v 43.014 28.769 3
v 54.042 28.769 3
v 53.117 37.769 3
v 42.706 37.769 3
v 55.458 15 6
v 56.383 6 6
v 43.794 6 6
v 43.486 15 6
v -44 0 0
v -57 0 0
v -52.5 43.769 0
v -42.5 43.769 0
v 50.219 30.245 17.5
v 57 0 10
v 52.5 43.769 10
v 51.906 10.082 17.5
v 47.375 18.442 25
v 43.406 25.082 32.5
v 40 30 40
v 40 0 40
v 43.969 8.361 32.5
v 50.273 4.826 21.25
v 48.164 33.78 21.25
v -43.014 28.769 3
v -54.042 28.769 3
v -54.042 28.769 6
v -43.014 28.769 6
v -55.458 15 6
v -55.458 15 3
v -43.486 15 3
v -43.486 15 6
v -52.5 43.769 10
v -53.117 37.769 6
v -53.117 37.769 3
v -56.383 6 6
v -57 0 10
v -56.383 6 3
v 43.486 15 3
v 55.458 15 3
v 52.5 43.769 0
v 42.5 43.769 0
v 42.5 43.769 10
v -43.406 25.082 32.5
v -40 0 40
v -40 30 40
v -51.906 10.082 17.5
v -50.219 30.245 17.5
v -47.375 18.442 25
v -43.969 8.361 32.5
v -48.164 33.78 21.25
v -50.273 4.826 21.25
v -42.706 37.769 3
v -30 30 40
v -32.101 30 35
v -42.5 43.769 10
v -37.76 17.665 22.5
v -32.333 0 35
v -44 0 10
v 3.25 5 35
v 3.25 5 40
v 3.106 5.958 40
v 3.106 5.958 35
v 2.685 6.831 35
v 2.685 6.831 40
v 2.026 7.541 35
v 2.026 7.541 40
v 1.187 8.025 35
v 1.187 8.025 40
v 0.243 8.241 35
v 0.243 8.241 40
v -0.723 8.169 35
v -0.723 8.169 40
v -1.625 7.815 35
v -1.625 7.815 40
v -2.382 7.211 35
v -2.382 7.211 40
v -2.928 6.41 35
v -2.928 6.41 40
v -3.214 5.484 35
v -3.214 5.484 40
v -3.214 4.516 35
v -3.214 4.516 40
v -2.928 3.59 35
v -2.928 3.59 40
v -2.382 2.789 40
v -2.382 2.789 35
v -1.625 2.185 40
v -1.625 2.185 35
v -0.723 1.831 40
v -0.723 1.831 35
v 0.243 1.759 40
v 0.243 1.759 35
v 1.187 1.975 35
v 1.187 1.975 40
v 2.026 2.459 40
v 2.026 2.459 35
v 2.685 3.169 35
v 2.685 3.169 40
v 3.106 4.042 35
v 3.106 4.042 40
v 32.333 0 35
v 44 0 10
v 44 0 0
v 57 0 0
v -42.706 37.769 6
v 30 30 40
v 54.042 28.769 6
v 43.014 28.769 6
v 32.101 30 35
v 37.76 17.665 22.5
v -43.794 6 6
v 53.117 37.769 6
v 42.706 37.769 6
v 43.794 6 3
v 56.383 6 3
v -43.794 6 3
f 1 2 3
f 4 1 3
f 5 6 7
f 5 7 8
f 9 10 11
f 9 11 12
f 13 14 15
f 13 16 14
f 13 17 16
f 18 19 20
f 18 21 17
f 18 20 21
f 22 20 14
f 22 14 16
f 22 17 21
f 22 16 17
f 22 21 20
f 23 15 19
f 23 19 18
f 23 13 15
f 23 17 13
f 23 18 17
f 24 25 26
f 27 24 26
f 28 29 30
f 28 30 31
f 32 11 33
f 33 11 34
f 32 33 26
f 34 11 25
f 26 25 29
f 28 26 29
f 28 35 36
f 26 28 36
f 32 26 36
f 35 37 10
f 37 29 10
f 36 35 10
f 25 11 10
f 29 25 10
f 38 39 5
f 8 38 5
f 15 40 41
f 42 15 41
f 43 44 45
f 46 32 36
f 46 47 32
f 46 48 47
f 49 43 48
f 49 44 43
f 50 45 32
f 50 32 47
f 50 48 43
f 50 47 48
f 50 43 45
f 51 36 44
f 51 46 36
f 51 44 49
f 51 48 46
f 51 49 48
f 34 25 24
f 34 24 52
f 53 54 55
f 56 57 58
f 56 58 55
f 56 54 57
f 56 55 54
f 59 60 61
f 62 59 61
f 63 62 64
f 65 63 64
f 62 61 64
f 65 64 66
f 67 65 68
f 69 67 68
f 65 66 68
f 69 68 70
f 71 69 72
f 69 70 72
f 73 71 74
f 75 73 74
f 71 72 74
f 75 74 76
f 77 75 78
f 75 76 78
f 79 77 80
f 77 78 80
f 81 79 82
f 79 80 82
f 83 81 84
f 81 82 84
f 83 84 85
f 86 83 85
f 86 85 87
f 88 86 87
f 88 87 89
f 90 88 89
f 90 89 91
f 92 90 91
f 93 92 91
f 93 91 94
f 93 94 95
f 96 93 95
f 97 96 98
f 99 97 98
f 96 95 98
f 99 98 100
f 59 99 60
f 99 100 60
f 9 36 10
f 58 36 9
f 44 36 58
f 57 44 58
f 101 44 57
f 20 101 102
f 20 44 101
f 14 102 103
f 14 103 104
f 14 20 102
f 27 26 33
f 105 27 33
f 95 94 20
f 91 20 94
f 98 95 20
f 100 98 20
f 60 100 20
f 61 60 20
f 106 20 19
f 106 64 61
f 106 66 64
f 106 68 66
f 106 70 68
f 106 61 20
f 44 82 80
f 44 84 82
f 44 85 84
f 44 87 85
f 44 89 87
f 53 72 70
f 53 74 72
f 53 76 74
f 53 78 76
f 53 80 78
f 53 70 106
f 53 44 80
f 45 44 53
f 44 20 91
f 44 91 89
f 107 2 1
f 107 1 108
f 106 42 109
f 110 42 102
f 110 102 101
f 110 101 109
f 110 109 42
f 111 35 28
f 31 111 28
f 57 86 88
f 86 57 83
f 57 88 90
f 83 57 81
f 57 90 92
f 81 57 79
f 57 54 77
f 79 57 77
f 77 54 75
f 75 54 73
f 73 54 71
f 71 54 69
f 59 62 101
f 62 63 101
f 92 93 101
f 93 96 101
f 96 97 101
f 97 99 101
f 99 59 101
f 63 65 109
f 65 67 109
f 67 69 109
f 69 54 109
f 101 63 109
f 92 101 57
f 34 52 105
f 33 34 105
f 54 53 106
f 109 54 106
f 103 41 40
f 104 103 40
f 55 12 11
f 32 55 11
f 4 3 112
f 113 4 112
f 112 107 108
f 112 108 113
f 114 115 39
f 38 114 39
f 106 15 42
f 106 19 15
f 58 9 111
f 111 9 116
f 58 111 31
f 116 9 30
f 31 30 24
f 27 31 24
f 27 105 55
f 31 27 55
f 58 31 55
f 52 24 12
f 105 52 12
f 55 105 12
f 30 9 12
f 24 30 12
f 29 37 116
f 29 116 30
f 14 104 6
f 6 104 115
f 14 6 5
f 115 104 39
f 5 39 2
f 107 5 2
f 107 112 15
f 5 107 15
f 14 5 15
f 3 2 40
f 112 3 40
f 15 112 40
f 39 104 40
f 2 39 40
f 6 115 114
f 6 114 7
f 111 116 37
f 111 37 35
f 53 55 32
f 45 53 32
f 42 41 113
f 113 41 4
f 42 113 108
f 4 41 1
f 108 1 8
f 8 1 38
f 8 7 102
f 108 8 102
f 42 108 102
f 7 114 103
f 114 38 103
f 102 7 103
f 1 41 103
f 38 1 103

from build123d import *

# Parameters (mm, degrees)
F1_DEPTH  = 10
F3_W      = 10
F3_H      = 30
F6_W      = 80
F6_H      = 30
F7_DEPTH  = 5
F8_R      = 3.25
F9_DEPTH  = 5
F10_W     = 9
F10_H     = 3
F11_DEPTH = 100


with BuildPart() as f1:
    # F0 (on Top) → F1 (new body)
    with BuildSketch(Plane.XY):
        Polygon((-52.5, 43.769281), (-57, 0), (-44, 0), (-42.5, 43.769281), align=None)
        Polygon((42.5, 43.769281), (44, 0), (57, 0), (52.5, 43.769281), align=None)
    extrude(amount=F1_DEPTH)

    # F1_face (on face) → F4 section 0
    with BuildSketch(Plane(origin=(-49.065217, 20.933135, 10), x_dir=(1, 0, 0), z_dir=(0, 0, 1))):
        Polygon((-3.434783, 22.836147), (-7.934783, -20.933135), (5.065217, -20.933135), (6.565217, 22.836147), align=None)
    # F3 (on offset) → F4 section 1
    with BuildSketch(Plane.XY.offset(40)):
        with Locations((-35, 15)):
            Rectangle(F3_W, F3_H)
    loft()

    # F1_face (on face) → F5 section 0
    with BuildSketch(Plane(origin=(-49.065217, 20.933135, 10), x_dir=(1, 0, 0), z_dir=(0, 0, 1))):
        Polygon((91.565217, 22.836147), (93.065217, -20.933135), (106.065217, -20.933135), (101.565217, 22.836147), align=None)
    # F3 (on offset) → F5 section 1
    with BuildSketch(Plane.XY.offset(40)):
        with Locations((35, 15)):
            Rectangle(F3_W, F3_H)
    loft()

    # F6 (on offset) → F7 (join)
    with BuildSketch(Plane.XY.offset(40)):
        with Locations((0, 15)):
            Rectangle(F6_W, F6_H)
    extrude(amount=-F7_DEPTH)

    # F8 (on offset) → F9 (cut, through all)
    with BuildSketch(Plane.XY.offset(40)):
        with Locations((0, 5)):
            Circle(F8_R)
    extrude(amount=-F9_DEPTH, mode=Mode.SUBTRACT)

    # F10 (on Right) → F11 (cut, symmetric)
    with BuildSketch(Plane.YZ):
        with Locations((10.5, 4.5)):
            Rectangle(F10_W, F10_H)
        with Locations((33.269281, 4.5)):
            Rectangle(F10_W, F10_H)
    extrude(amount=F11_DEPTH, both=True, mode=Mode.SUBTRACT)


solid = f1.part
